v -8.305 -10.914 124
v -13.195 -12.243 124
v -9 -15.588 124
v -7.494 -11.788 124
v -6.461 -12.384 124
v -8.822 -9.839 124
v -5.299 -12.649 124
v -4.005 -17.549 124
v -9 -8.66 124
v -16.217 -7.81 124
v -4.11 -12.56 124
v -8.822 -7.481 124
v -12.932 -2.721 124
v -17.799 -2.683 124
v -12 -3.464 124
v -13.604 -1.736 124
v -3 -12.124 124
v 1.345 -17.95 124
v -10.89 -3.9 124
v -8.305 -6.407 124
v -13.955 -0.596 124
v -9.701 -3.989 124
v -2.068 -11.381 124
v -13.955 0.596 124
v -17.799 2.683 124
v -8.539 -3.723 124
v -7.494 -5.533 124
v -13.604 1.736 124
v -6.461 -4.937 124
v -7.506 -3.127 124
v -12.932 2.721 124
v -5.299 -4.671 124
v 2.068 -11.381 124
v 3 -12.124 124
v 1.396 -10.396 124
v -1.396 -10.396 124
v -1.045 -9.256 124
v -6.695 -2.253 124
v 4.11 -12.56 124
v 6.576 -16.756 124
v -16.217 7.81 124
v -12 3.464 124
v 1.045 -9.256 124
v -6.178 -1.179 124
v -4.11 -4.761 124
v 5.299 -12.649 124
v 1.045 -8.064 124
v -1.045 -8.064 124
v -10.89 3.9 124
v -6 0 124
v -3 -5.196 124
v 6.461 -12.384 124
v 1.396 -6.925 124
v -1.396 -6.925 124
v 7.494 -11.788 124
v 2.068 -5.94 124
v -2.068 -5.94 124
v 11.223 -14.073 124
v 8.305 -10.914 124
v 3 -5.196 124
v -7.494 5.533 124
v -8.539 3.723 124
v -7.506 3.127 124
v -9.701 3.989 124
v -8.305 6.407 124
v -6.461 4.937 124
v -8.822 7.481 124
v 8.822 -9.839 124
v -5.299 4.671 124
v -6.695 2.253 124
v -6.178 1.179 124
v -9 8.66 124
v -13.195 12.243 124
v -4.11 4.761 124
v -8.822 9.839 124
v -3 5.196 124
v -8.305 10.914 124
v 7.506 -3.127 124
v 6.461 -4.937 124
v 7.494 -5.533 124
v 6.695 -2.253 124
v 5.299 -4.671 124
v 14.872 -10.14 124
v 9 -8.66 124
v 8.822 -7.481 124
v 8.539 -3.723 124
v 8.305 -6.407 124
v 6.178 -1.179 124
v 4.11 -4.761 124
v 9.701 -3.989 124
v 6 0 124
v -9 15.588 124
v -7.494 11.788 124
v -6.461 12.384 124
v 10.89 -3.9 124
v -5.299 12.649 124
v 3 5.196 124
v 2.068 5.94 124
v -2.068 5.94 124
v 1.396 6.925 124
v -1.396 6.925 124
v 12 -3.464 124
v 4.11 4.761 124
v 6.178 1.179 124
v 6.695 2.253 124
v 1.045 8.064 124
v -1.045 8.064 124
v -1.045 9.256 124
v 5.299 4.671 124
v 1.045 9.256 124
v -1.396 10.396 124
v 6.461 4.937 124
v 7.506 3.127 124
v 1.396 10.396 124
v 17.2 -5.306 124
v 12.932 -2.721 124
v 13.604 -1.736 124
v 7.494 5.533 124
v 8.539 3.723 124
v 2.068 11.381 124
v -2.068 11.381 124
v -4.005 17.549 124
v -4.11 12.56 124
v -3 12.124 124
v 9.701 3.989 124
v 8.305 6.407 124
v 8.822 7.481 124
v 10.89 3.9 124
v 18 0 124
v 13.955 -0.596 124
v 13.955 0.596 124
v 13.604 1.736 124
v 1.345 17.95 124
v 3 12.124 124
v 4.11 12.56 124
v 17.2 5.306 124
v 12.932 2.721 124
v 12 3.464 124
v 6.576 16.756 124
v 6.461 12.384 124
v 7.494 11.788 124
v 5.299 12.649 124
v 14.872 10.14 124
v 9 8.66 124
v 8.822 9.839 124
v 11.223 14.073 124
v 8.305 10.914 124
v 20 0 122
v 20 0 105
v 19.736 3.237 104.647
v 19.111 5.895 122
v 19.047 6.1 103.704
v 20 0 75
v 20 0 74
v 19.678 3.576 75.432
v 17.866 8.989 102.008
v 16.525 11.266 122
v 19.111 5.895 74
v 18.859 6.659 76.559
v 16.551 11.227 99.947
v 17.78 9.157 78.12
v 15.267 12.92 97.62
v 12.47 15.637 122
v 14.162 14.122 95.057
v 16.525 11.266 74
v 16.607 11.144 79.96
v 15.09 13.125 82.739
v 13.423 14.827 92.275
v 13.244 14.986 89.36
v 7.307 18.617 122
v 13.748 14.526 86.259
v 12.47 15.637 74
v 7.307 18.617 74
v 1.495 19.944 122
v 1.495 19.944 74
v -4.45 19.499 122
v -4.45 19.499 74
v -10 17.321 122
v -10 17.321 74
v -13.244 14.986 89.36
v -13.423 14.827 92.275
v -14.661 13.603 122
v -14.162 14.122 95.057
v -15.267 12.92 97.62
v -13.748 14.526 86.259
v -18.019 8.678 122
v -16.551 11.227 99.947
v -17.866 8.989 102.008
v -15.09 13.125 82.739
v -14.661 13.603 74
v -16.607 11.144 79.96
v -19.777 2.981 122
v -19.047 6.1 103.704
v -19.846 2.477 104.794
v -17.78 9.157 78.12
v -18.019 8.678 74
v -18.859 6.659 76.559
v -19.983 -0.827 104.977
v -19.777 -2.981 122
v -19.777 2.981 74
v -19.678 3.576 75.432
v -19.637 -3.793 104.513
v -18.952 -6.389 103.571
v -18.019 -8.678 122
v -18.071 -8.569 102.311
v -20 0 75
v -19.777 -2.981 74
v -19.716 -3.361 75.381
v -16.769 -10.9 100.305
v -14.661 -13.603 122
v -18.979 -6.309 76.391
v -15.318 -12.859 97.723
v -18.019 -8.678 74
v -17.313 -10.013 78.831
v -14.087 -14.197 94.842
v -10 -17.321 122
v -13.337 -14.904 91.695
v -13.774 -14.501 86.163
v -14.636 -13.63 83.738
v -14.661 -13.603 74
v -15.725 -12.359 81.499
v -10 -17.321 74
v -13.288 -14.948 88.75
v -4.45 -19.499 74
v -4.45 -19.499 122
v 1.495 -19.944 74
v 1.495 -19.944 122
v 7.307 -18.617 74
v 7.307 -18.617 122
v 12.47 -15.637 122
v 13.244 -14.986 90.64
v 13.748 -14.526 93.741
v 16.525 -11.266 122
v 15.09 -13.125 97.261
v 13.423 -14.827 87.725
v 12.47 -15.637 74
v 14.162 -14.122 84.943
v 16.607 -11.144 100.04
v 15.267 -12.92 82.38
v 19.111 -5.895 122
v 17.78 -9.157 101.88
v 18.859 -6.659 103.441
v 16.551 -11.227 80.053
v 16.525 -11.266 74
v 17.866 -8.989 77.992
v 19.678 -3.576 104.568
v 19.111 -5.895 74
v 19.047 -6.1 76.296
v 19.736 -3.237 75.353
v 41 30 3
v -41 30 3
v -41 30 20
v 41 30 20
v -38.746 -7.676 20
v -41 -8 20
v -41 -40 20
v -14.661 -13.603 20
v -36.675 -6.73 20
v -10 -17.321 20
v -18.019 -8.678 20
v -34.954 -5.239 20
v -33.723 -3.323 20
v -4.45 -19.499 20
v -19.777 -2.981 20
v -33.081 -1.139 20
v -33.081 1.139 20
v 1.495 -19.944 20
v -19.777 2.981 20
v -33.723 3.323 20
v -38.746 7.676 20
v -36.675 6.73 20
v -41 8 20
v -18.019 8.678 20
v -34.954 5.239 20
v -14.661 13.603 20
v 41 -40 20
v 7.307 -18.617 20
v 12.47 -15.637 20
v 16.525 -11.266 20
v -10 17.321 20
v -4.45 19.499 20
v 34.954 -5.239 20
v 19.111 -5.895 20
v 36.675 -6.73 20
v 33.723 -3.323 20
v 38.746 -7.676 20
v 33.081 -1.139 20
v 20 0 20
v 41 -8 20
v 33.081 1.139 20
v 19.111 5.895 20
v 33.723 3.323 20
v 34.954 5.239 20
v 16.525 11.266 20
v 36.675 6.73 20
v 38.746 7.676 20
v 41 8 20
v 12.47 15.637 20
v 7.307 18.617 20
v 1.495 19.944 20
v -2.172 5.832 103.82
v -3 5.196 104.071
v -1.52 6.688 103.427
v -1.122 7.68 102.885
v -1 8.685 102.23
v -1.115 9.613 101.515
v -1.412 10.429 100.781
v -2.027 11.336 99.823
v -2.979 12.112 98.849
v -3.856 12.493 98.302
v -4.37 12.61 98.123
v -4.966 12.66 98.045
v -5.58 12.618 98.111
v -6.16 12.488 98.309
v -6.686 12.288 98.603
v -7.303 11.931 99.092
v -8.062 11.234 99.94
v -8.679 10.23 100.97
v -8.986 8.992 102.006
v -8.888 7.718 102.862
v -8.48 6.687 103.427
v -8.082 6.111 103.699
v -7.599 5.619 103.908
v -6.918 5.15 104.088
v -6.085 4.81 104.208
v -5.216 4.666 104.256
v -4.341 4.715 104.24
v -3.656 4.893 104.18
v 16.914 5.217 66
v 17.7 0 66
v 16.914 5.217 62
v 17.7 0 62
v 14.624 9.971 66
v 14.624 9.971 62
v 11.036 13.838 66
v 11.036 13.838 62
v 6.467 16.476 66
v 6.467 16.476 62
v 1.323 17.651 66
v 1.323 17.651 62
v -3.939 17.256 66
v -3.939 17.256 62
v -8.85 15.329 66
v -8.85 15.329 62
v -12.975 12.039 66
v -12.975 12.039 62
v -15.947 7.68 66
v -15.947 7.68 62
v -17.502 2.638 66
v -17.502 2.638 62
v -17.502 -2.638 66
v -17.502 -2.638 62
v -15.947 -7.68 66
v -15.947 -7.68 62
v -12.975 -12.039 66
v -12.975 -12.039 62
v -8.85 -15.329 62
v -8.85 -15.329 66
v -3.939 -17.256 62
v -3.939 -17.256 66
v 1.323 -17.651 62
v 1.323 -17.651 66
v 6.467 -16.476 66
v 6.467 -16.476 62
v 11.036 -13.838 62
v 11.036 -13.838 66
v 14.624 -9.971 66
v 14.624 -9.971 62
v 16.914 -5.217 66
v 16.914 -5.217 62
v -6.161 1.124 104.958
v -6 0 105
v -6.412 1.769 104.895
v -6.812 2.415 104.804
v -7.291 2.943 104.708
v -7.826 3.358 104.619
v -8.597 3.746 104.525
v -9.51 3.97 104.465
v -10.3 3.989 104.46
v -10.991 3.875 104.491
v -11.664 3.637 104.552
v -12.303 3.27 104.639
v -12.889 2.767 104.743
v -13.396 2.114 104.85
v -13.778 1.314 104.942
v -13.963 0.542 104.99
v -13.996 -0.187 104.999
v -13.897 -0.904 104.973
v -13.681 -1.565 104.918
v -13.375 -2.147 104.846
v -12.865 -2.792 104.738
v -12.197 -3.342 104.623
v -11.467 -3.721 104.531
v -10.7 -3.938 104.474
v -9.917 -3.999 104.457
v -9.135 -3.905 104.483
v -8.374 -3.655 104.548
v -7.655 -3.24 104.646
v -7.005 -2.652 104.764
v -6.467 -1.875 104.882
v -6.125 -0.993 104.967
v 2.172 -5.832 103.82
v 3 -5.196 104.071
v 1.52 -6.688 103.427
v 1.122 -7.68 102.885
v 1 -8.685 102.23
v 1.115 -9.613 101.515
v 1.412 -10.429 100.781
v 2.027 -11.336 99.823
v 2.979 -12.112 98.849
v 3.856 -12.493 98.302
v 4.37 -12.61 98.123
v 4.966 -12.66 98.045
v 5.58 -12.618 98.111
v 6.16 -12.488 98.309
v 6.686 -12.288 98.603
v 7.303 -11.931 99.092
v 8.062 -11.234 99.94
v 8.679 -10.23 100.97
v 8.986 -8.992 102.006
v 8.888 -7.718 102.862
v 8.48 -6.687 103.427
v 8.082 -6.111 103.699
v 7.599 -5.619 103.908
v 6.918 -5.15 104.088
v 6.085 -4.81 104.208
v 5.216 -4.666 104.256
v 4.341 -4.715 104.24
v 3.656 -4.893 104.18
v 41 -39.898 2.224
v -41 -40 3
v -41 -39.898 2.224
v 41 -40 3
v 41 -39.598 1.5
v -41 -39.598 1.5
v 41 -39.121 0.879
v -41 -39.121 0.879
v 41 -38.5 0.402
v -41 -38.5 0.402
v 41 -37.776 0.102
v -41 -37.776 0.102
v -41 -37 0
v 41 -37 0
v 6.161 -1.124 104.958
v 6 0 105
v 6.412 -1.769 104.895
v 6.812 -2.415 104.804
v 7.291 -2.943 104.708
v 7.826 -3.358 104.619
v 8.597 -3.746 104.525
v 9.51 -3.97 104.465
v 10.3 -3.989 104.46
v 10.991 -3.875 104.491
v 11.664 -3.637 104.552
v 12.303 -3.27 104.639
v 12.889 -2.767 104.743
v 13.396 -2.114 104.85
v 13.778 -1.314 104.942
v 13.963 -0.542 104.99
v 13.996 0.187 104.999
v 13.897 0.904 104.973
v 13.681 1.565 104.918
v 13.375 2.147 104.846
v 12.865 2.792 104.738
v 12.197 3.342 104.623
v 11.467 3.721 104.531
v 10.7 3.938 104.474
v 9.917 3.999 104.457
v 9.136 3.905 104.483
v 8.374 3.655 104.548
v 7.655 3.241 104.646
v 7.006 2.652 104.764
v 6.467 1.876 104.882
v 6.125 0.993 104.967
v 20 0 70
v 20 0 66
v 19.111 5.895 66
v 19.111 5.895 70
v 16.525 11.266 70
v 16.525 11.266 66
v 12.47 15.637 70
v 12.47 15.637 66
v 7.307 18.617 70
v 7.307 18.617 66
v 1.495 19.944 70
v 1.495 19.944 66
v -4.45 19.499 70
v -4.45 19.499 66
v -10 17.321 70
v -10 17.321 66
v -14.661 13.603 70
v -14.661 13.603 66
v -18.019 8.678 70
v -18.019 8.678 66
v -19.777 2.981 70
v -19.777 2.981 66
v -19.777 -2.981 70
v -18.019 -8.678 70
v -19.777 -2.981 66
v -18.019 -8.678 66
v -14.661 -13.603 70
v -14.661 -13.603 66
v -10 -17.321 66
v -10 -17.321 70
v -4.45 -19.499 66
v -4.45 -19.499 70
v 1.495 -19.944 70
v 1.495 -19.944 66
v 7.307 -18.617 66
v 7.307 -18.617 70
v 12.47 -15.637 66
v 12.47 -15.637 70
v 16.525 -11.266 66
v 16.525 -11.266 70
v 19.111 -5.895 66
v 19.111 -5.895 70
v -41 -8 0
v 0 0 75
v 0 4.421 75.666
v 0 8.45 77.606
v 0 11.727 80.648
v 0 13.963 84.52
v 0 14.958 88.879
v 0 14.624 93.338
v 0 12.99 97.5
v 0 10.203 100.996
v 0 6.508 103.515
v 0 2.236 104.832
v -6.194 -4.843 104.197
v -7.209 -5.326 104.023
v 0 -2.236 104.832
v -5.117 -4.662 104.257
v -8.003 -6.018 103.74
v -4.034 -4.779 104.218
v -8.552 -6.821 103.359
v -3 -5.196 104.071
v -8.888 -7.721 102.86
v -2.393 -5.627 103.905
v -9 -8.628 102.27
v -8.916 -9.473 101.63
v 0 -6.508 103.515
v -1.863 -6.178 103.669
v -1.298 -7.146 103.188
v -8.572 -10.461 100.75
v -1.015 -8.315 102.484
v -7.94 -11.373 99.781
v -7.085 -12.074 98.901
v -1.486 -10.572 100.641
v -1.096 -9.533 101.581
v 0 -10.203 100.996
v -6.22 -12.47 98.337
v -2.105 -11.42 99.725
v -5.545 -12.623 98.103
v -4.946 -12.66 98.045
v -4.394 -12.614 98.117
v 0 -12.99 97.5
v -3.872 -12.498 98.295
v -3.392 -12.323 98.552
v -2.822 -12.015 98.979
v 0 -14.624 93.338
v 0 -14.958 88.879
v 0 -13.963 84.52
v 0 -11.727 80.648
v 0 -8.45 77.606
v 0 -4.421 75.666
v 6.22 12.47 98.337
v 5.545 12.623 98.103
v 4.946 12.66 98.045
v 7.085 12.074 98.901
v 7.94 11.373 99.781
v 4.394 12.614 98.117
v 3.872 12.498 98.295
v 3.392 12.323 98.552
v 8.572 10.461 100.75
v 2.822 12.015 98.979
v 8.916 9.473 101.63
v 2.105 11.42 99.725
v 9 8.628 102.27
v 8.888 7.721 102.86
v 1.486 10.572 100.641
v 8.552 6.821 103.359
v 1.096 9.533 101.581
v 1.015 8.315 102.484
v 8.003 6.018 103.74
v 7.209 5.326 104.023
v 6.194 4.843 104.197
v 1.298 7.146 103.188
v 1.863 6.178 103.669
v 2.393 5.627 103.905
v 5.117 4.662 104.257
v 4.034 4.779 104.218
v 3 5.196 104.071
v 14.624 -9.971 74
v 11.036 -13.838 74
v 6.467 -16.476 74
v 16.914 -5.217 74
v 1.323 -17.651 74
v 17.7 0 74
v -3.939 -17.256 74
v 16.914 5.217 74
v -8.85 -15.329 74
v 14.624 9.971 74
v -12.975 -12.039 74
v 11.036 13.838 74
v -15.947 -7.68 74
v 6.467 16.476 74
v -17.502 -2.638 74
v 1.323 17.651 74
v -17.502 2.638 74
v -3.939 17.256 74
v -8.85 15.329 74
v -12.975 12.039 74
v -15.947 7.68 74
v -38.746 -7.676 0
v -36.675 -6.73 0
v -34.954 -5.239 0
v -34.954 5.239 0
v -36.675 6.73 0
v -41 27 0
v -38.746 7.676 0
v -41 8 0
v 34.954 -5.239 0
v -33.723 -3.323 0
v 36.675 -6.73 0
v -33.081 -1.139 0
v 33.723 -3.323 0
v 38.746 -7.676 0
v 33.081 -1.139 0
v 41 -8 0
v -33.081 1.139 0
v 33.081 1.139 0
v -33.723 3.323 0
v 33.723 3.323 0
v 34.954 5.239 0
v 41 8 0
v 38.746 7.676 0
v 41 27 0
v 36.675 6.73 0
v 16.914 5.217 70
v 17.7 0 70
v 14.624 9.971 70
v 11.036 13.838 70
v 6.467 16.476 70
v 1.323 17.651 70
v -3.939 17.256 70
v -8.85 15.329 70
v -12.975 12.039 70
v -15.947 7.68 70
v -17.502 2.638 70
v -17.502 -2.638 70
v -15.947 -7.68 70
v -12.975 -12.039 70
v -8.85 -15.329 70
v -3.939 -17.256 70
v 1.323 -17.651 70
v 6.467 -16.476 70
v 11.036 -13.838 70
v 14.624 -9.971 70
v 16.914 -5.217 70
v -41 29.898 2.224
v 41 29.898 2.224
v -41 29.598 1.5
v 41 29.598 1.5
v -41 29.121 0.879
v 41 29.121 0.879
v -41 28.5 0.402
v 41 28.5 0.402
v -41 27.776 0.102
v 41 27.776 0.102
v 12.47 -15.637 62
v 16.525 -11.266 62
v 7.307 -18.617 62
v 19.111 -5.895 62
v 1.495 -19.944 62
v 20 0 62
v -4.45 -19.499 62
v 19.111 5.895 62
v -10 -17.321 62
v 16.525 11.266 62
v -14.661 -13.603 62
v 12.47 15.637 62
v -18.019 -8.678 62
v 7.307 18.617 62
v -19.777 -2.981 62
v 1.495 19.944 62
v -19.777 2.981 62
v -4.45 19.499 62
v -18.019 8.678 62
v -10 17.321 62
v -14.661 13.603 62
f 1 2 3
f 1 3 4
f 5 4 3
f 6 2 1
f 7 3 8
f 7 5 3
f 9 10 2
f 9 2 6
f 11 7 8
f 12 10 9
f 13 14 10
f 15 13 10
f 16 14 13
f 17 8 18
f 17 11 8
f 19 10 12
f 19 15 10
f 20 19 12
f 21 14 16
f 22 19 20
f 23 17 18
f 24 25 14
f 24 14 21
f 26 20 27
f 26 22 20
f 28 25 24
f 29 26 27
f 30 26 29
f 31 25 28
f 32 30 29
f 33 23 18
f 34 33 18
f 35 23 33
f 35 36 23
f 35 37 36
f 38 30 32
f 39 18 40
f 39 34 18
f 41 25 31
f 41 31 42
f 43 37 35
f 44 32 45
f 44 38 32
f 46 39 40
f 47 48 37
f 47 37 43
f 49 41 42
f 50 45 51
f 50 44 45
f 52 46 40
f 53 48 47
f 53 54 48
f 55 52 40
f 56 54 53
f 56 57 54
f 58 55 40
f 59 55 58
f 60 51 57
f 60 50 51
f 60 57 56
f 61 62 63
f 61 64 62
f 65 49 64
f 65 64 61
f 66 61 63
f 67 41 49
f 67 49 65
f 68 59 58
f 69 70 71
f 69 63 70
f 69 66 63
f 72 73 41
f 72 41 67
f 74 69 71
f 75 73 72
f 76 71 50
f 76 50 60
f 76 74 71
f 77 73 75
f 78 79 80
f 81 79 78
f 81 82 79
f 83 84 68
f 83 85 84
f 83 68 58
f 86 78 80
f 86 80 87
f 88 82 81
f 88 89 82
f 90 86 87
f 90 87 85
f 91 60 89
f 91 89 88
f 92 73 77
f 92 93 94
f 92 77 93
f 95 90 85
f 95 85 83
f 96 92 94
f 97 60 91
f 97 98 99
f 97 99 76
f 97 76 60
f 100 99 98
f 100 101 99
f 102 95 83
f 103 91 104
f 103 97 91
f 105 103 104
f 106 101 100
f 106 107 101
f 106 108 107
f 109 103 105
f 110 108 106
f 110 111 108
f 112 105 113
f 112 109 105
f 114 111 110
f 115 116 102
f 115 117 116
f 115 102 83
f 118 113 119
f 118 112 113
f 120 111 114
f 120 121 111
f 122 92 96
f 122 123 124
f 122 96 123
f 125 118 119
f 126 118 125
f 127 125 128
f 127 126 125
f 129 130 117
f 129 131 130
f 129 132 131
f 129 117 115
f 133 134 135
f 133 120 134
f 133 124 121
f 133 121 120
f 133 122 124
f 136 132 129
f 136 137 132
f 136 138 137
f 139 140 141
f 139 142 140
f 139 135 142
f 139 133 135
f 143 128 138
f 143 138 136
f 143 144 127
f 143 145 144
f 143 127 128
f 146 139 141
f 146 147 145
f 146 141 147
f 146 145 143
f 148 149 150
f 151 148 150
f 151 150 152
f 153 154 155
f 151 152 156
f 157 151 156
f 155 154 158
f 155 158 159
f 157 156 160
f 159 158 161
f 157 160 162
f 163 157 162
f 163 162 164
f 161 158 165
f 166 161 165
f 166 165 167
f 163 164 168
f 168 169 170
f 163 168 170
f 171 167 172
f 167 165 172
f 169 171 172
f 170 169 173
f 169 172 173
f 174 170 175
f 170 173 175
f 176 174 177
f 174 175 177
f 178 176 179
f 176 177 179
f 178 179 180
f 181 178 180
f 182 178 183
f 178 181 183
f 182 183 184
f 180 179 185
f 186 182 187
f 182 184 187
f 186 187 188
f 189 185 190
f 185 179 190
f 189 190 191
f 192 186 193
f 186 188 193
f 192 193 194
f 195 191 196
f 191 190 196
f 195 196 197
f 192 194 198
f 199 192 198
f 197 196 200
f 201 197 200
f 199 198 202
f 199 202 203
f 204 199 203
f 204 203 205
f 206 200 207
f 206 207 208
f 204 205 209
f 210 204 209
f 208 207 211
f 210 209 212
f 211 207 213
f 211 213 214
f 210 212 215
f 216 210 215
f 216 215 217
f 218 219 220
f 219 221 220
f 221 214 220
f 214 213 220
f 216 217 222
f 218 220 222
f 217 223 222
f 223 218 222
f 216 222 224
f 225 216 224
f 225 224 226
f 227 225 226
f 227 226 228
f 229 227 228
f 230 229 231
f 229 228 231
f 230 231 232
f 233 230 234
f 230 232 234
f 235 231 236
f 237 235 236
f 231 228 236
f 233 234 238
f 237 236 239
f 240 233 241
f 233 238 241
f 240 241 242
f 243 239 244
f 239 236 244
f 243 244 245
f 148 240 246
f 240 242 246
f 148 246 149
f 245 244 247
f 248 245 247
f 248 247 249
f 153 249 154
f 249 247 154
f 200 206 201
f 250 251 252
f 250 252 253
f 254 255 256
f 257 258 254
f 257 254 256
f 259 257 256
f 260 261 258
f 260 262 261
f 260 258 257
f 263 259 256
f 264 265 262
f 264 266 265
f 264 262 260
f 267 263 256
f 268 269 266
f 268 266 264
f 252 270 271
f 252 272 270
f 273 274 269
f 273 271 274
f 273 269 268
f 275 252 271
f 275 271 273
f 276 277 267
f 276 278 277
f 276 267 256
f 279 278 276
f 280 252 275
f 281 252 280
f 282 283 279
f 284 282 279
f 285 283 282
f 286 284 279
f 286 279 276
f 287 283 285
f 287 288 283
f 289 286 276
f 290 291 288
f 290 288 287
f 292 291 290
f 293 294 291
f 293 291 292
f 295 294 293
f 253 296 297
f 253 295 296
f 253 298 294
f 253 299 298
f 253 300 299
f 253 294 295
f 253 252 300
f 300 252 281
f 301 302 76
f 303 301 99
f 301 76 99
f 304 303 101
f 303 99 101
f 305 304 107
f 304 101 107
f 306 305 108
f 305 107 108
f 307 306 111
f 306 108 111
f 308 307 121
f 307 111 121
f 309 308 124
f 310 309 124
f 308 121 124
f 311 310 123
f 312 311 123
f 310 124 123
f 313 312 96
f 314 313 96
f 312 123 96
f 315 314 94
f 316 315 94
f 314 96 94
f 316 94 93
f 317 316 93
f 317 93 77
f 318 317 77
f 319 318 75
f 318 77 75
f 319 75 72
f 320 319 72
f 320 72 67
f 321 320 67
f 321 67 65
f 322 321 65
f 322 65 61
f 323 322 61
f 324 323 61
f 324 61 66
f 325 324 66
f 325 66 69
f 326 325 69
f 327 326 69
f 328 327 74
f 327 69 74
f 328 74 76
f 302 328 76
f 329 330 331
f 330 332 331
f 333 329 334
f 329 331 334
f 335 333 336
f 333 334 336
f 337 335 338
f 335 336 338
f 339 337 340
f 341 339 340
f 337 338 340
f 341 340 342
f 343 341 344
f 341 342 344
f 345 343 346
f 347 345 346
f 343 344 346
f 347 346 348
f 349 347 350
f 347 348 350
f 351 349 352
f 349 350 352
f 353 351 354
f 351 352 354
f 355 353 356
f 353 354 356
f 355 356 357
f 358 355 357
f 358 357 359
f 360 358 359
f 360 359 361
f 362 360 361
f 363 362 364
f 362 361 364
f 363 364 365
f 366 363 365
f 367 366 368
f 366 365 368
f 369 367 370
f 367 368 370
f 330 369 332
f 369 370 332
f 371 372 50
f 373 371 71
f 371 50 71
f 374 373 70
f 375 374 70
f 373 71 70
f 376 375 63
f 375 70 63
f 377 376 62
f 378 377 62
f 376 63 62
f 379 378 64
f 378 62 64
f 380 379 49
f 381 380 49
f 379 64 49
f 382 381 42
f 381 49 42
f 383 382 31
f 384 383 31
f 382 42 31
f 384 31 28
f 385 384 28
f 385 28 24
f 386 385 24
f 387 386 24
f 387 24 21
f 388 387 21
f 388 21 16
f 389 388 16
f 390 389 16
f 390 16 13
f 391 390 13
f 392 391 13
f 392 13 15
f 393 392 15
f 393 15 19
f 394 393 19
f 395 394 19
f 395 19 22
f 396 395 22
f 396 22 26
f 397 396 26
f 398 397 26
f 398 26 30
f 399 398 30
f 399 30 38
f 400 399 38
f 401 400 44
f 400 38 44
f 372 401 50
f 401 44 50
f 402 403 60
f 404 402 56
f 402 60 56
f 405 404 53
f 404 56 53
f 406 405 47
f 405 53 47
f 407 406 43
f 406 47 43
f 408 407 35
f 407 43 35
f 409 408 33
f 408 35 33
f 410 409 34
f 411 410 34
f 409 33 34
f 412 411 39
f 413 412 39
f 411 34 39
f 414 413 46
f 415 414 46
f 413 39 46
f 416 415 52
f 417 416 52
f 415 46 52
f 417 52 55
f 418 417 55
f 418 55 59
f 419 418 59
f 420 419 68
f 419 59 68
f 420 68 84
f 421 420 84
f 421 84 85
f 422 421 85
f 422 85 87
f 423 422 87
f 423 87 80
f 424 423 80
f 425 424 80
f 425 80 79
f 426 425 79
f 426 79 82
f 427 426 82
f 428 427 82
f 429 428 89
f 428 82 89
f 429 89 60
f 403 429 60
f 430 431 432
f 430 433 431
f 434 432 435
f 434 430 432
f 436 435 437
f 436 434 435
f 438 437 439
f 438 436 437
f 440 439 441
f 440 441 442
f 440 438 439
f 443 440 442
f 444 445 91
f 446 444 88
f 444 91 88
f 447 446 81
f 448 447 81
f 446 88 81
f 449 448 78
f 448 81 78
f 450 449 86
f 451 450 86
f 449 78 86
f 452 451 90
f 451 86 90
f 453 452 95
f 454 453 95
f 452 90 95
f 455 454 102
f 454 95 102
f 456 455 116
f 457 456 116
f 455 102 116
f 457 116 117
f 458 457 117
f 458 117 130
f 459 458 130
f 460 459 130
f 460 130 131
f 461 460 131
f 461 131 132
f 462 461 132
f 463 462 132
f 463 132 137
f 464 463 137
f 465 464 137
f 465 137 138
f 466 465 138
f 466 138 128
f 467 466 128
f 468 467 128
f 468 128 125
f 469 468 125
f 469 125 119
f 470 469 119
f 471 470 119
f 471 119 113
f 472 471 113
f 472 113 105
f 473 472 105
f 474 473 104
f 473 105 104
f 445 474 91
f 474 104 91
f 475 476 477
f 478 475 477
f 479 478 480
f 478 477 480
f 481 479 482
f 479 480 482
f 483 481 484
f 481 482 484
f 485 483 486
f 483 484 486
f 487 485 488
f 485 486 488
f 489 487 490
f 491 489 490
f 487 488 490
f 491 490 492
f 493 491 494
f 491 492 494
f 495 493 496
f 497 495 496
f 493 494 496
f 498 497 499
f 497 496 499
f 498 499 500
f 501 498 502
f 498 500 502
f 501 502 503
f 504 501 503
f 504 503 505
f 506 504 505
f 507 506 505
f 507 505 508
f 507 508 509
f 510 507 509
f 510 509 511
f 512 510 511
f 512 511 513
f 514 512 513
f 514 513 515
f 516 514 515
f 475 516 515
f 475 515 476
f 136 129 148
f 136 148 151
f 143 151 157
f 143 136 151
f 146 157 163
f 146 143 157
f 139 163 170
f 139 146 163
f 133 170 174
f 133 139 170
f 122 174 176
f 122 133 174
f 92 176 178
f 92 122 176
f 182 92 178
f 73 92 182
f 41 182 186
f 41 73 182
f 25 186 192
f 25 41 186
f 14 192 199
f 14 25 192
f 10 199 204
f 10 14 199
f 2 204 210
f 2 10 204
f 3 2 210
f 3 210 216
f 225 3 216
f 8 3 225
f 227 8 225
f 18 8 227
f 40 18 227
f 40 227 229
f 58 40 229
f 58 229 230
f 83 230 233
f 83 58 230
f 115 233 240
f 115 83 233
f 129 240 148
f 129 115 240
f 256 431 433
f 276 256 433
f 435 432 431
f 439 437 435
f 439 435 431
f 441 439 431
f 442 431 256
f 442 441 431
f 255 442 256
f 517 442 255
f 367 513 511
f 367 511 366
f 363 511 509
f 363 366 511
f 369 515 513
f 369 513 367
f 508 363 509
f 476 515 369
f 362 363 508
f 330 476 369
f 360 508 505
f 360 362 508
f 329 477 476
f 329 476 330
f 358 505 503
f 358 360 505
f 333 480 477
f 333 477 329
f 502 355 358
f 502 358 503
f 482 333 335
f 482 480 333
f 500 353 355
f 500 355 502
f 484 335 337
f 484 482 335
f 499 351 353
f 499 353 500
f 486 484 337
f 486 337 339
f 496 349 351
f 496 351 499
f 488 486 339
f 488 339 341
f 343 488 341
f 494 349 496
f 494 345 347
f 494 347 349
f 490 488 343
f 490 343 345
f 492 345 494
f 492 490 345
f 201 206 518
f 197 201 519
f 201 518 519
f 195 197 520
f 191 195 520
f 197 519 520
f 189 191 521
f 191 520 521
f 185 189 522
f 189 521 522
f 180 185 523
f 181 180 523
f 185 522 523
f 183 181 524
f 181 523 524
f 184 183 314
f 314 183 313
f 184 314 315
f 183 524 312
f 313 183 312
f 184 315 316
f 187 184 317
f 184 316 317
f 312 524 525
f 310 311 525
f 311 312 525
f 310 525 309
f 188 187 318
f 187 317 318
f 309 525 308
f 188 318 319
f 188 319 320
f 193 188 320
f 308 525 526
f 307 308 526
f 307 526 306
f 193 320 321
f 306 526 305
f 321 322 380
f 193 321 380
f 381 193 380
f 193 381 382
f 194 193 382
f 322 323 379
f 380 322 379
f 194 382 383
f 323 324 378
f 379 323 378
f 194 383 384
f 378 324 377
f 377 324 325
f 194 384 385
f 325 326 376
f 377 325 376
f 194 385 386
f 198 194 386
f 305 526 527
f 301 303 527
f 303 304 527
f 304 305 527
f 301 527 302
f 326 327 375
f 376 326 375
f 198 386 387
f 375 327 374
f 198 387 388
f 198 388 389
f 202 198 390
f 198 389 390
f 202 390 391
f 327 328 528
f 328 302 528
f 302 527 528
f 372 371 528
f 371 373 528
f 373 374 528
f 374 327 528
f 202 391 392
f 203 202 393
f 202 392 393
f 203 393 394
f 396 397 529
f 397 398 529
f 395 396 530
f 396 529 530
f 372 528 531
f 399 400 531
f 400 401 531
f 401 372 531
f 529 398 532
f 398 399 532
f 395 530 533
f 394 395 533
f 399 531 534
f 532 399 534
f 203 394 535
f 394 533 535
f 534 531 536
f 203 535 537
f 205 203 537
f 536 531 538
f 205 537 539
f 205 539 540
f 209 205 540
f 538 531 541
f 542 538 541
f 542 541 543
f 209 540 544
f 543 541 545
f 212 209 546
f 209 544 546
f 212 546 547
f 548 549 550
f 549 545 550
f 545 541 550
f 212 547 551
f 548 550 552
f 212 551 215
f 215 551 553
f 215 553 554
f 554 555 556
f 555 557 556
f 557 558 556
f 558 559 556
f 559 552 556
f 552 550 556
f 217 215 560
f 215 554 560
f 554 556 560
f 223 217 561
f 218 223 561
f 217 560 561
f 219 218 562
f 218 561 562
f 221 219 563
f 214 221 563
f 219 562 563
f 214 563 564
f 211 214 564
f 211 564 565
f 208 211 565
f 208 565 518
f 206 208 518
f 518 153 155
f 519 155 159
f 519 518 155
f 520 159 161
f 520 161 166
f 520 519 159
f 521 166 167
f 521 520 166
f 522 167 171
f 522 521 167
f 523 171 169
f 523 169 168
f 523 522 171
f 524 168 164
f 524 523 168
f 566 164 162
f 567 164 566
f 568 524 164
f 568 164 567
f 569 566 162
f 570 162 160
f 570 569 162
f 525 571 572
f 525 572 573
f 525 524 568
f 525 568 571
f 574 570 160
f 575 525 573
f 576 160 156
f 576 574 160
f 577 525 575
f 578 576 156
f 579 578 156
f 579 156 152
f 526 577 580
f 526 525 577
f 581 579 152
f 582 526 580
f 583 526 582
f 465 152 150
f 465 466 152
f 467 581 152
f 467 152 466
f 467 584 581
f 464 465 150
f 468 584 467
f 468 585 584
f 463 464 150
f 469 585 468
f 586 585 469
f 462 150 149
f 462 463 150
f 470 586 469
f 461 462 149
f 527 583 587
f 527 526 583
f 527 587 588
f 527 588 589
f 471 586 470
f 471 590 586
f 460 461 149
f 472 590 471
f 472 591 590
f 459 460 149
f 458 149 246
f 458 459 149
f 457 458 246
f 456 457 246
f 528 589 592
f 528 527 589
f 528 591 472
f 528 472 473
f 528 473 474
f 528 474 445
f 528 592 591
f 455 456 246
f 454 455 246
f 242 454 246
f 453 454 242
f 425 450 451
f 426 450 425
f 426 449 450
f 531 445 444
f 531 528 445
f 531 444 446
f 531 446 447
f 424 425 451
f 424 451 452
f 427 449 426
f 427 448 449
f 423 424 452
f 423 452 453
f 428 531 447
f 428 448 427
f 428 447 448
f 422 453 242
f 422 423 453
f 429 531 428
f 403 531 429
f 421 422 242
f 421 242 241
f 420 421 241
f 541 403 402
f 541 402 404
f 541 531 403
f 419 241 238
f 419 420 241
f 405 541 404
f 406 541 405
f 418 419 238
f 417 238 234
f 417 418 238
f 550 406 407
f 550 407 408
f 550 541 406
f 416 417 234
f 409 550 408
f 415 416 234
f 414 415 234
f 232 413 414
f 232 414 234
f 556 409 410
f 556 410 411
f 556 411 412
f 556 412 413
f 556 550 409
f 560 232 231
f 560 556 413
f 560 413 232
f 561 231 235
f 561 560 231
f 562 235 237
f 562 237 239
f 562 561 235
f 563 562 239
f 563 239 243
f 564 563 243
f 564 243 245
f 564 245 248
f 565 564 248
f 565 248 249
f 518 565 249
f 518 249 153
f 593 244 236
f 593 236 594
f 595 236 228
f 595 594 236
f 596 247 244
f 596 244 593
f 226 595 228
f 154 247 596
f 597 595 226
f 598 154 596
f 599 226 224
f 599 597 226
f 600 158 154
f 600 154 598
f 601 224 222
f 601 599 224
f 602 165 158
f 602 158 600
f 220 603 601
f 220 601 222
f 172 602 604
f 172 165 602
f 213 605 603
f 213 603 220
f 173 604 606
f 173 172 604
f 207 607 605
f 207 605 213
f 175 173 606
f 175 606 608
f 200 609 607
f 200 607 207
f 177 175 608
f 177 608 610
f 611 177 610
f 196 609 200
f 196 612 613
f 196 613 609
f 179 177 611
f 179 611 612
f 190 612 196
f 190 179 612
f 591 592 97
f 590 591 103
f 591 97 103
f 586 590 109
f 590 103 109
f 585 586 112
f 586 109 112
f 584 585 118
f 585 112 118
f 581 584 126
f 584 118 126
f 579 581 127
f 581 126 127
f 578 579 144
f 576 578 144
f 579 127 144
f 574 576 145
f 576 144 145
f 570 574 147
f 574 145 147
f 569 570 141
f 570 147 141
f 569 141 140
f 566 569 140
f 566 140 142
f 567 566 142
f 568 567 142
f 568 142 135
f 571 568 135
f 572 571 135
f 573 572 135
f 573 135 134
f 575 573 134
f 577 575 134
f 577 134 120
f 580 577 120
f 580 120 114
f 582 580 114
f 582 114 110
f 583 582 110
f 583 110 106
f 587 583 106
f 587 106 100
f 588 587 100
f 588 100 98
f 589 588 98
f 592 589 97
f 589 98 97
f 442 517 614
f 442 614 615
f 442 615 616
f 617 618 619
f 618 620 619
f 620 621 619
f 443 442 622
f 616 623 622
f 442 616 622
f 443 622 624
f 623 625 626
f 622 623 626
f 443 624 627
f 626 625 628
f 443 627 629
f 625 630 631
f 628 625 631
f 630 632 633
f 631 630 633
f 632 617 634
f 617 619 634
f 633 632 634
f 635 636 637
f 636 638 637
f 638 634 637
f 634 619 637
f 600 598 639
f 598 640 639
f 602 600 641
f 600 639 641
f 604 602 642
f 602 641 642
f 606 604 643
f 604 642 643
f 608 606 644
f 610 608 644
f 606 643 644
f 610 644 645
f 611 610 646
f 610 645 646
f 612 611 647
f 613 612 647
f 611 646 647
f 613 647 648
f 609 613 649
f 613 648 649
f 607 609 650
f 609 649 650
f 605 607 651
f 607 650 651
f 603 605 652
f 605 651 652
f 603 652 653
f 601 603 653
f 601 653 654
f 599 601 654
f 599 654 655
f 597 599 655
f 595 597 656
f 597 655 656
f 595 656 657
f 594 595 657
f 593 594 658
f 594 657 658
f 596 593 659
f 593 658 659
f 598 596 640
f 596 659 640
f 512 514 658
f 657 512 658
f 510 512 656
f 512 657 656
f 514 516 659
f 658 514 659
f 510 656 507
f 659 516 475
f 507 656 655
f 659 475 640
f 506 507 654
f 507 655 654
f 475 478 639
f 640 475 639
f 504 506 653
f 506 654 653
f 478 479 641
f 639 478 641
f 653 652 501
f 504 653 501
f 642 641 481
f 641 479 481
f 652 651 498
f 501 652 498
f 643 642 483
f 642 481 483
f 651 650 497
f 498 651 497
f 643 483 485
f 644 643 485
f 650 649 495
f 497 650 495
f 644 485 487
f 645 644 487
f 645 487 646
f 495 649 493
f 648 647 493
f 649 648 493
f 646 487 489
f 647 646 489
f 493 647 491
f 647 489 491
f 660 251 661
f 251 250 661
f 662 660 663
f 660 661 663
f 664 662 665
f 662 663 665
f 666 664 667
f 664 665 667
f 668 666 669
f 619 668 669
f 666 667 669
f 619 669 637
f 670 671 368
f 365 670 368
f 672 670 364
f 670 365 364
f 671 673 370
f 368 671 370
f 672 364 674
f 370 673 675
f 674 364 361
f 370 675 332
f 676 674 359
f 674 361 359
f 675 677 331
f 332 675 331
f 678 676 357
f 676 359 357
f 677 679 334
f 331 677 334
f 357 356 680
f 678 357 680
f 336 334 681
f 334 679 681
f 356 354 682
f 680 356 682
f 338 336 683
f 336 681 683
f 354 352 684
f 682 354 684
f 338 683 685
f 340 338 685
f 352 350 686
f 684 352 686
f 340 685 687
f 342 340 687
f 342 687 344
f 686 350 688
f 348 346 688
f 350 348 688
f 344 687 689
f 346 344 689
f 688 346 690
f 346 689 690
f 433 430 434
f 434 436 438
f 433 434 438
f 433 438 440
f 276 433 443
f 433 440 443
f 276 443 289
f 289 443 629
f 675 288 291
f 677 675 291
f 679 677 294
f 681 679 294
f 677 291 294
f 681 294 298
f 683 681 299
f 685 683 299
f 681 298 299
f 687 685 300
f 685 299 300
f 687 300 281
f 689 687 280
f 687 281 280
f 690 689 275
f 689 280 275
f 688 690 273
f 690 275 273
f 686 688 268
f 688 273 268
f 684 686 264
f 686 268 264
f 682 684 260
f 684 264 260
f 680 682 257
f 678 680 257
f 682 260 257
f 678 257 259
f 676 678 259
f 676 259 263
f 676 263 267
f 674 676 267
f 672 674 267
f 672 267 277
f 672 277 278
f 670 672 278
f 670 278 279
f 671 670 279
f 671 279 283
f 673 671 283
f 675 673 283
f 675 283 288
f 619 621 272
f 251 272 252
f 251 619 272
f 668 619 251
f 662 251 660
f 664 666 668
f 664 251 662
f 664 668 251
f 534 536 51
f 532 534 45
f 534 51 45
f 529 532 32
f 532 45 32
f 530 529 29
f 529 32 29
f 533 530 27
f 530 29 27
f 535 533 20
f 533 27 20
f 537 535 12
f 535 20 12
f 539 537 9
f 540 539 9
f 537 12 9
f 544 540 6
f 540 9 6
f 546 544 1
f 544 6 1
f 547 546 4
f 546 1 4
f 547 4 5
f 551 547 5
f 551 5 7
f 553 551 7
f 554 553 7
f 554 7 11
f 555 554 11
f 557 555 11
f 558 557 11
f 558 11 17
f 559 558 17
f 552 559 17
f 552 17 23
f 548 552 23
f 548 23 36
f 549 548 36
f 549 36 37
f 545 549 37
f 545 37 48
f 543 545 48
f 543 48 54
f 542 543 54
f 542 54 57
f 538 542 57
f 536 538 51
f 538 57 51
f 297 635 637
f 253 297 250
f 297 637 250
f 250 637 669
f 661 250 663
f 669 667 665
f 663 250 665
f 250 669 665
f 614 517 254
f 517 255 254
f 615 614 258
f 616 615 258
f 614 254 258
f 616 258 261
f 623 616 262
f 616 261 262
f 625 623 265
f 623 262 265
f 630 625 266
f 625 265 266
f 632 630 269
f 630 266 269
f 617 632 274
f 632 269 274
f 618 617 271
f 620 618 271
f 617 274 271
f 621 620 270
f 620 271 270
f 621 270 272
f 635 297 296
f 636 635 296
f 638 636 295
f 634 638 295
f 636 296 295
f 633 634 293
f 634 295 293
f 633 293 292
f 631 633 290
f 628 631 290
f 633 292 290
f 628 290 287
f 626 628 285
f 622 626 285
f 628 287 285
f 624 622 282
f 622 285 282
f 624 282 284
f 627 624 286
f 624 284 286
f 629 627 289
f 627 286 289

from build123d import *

# Parameters (mm, degrees)
SKETCH1_W               = 82
SKETCH1_H               = 70
BOSS_EXTRUDE1_DEPTH     = 20
SKETCH2_R               = 8
CUT_EXTRUDE1_DEPTH      = 20
SKETCH3_R               = 20
BOSS_EXTRUDE2_DEPTH     = 104
SKETCH4_R               = 15
CUT_EXTRUDE2_DEPTH      = 42
CUT_EXTRUDE2_DEPTH_BACK = 42
SKETCH5_W               = 2.3
SKETCH5_H               = 4
SKETCH6_R               = 4
CUT_EXTRUDE3_DEPTH      = 30
CIRPATTERN1_COUNT       = 6
CHAMFER1_SIZE           = 2
FILLET1_R               = 3


with BuildPart() as part:
    # Sketch1 → Boss-Extrude1 (new body)
    with BuildSketch(Plane.XY):
        with Locations((0, -5)):
            Rectangle(SKETCH1_W, SKETCH1_H)
    extrude(amount=BOSS_EXTRUDE1_DEPTH)

    # Sketch2 → Cut-Extrude1 (cut)
    with BuildSketch(Plane.XY.offset(20)):
        with Locations((-41, 0)):
            Circle(SKETCH2_R)
        with Locations((41, 0)):
            Circle(SKETCH2_R)
    extrude(amount=-CUT_EXTRUDE1_DEPTH, mode=Mode.SUBTRACT)

    # Sketch3 → Boss-Extrude2 (add)
    with BuildSketch(Plane.XY.offset(20)):
        Circle(SKETCH3_R)
    extrude(amount=BOSS_EXTRUDE2_DEPTH)

    # Sketch4 → Cut-Extrude2 (cut, two sides)
    with BuildSketch(Plane(origin=(0, 0, 0), x_dir=(0, 0, -1), z_dir=(1, 0, 0))) as cut_extrude2_sk:
        with Locations((-90, 0)):
            Circle(SKETCH4_R)
    extrude(amount=CUT_EXTRUDE2_DEPTH, mode=Mode.SUBTRACT)
    extrude(cut_extrude2_sk.sketch, amount=-CUT_EXTRUDE2_DEPTH_BACK, mode=Mode.SUBTRACT)

    # Sketch5 → Cut-Revolve1 (revolve, cut)
    with BuildSketch(Plane(origin=(0, 0, 0), x_dir=(1, 0, 0), z_dir=(0, 1, 0))):
        with Locations((18.85, -72)):
            Rectangle(SKETCH5_W, SKETCH5_H)
        with Locations((18.85, -64)):
            Rectangle(SKETCH5_W, SKETCH5_H)
    revolve(axis=Axis((0, 0, 20), (0, 0, 1)), mode=Mode.SUBTRACT)

    # Sketch6 → Cut-Extrude3 (cut)
    with BuildSketch(Plane.XY.offset(124)):
        with Locations((-10, 0)):
            Circle(SKETCH6_R)
    cut_extrude3 = extrude(amount=-CUT_EXTRUDE3_DEPTH, mode=Mode.SUBTRACT)

    # CirPattern1: Cut-Extrude3 ×6 about axis
    cirpattern1_axis = Axis((0, 0, 0), (0, 0, 1))
    for i in range(1, CIRPATTERN1_COUNT):
        add(cut_extrude3.rotate(cirpattern1_axis, i * 360 / CIRPATTERN1_COUNT), mode=Mode.SUBTRACT)

    # Chamfer1
    chamfer1_edges = [part.edges().sort_by_distance(p)[0] for p in [
        (-20, 0, 124),
    ]]
    chamfer(chamfer1_edges, length=CHAMFER1_SIZE)

    # Fillet1
    fillet1_edges = [part.edges().sort_by_distance(p)[0] for p in [
        (0, -40, 0),
        (0, 30, 0),
    ]]
    fillet(fillet1_edges, radius=FILLET1_R)


solid = part.part
